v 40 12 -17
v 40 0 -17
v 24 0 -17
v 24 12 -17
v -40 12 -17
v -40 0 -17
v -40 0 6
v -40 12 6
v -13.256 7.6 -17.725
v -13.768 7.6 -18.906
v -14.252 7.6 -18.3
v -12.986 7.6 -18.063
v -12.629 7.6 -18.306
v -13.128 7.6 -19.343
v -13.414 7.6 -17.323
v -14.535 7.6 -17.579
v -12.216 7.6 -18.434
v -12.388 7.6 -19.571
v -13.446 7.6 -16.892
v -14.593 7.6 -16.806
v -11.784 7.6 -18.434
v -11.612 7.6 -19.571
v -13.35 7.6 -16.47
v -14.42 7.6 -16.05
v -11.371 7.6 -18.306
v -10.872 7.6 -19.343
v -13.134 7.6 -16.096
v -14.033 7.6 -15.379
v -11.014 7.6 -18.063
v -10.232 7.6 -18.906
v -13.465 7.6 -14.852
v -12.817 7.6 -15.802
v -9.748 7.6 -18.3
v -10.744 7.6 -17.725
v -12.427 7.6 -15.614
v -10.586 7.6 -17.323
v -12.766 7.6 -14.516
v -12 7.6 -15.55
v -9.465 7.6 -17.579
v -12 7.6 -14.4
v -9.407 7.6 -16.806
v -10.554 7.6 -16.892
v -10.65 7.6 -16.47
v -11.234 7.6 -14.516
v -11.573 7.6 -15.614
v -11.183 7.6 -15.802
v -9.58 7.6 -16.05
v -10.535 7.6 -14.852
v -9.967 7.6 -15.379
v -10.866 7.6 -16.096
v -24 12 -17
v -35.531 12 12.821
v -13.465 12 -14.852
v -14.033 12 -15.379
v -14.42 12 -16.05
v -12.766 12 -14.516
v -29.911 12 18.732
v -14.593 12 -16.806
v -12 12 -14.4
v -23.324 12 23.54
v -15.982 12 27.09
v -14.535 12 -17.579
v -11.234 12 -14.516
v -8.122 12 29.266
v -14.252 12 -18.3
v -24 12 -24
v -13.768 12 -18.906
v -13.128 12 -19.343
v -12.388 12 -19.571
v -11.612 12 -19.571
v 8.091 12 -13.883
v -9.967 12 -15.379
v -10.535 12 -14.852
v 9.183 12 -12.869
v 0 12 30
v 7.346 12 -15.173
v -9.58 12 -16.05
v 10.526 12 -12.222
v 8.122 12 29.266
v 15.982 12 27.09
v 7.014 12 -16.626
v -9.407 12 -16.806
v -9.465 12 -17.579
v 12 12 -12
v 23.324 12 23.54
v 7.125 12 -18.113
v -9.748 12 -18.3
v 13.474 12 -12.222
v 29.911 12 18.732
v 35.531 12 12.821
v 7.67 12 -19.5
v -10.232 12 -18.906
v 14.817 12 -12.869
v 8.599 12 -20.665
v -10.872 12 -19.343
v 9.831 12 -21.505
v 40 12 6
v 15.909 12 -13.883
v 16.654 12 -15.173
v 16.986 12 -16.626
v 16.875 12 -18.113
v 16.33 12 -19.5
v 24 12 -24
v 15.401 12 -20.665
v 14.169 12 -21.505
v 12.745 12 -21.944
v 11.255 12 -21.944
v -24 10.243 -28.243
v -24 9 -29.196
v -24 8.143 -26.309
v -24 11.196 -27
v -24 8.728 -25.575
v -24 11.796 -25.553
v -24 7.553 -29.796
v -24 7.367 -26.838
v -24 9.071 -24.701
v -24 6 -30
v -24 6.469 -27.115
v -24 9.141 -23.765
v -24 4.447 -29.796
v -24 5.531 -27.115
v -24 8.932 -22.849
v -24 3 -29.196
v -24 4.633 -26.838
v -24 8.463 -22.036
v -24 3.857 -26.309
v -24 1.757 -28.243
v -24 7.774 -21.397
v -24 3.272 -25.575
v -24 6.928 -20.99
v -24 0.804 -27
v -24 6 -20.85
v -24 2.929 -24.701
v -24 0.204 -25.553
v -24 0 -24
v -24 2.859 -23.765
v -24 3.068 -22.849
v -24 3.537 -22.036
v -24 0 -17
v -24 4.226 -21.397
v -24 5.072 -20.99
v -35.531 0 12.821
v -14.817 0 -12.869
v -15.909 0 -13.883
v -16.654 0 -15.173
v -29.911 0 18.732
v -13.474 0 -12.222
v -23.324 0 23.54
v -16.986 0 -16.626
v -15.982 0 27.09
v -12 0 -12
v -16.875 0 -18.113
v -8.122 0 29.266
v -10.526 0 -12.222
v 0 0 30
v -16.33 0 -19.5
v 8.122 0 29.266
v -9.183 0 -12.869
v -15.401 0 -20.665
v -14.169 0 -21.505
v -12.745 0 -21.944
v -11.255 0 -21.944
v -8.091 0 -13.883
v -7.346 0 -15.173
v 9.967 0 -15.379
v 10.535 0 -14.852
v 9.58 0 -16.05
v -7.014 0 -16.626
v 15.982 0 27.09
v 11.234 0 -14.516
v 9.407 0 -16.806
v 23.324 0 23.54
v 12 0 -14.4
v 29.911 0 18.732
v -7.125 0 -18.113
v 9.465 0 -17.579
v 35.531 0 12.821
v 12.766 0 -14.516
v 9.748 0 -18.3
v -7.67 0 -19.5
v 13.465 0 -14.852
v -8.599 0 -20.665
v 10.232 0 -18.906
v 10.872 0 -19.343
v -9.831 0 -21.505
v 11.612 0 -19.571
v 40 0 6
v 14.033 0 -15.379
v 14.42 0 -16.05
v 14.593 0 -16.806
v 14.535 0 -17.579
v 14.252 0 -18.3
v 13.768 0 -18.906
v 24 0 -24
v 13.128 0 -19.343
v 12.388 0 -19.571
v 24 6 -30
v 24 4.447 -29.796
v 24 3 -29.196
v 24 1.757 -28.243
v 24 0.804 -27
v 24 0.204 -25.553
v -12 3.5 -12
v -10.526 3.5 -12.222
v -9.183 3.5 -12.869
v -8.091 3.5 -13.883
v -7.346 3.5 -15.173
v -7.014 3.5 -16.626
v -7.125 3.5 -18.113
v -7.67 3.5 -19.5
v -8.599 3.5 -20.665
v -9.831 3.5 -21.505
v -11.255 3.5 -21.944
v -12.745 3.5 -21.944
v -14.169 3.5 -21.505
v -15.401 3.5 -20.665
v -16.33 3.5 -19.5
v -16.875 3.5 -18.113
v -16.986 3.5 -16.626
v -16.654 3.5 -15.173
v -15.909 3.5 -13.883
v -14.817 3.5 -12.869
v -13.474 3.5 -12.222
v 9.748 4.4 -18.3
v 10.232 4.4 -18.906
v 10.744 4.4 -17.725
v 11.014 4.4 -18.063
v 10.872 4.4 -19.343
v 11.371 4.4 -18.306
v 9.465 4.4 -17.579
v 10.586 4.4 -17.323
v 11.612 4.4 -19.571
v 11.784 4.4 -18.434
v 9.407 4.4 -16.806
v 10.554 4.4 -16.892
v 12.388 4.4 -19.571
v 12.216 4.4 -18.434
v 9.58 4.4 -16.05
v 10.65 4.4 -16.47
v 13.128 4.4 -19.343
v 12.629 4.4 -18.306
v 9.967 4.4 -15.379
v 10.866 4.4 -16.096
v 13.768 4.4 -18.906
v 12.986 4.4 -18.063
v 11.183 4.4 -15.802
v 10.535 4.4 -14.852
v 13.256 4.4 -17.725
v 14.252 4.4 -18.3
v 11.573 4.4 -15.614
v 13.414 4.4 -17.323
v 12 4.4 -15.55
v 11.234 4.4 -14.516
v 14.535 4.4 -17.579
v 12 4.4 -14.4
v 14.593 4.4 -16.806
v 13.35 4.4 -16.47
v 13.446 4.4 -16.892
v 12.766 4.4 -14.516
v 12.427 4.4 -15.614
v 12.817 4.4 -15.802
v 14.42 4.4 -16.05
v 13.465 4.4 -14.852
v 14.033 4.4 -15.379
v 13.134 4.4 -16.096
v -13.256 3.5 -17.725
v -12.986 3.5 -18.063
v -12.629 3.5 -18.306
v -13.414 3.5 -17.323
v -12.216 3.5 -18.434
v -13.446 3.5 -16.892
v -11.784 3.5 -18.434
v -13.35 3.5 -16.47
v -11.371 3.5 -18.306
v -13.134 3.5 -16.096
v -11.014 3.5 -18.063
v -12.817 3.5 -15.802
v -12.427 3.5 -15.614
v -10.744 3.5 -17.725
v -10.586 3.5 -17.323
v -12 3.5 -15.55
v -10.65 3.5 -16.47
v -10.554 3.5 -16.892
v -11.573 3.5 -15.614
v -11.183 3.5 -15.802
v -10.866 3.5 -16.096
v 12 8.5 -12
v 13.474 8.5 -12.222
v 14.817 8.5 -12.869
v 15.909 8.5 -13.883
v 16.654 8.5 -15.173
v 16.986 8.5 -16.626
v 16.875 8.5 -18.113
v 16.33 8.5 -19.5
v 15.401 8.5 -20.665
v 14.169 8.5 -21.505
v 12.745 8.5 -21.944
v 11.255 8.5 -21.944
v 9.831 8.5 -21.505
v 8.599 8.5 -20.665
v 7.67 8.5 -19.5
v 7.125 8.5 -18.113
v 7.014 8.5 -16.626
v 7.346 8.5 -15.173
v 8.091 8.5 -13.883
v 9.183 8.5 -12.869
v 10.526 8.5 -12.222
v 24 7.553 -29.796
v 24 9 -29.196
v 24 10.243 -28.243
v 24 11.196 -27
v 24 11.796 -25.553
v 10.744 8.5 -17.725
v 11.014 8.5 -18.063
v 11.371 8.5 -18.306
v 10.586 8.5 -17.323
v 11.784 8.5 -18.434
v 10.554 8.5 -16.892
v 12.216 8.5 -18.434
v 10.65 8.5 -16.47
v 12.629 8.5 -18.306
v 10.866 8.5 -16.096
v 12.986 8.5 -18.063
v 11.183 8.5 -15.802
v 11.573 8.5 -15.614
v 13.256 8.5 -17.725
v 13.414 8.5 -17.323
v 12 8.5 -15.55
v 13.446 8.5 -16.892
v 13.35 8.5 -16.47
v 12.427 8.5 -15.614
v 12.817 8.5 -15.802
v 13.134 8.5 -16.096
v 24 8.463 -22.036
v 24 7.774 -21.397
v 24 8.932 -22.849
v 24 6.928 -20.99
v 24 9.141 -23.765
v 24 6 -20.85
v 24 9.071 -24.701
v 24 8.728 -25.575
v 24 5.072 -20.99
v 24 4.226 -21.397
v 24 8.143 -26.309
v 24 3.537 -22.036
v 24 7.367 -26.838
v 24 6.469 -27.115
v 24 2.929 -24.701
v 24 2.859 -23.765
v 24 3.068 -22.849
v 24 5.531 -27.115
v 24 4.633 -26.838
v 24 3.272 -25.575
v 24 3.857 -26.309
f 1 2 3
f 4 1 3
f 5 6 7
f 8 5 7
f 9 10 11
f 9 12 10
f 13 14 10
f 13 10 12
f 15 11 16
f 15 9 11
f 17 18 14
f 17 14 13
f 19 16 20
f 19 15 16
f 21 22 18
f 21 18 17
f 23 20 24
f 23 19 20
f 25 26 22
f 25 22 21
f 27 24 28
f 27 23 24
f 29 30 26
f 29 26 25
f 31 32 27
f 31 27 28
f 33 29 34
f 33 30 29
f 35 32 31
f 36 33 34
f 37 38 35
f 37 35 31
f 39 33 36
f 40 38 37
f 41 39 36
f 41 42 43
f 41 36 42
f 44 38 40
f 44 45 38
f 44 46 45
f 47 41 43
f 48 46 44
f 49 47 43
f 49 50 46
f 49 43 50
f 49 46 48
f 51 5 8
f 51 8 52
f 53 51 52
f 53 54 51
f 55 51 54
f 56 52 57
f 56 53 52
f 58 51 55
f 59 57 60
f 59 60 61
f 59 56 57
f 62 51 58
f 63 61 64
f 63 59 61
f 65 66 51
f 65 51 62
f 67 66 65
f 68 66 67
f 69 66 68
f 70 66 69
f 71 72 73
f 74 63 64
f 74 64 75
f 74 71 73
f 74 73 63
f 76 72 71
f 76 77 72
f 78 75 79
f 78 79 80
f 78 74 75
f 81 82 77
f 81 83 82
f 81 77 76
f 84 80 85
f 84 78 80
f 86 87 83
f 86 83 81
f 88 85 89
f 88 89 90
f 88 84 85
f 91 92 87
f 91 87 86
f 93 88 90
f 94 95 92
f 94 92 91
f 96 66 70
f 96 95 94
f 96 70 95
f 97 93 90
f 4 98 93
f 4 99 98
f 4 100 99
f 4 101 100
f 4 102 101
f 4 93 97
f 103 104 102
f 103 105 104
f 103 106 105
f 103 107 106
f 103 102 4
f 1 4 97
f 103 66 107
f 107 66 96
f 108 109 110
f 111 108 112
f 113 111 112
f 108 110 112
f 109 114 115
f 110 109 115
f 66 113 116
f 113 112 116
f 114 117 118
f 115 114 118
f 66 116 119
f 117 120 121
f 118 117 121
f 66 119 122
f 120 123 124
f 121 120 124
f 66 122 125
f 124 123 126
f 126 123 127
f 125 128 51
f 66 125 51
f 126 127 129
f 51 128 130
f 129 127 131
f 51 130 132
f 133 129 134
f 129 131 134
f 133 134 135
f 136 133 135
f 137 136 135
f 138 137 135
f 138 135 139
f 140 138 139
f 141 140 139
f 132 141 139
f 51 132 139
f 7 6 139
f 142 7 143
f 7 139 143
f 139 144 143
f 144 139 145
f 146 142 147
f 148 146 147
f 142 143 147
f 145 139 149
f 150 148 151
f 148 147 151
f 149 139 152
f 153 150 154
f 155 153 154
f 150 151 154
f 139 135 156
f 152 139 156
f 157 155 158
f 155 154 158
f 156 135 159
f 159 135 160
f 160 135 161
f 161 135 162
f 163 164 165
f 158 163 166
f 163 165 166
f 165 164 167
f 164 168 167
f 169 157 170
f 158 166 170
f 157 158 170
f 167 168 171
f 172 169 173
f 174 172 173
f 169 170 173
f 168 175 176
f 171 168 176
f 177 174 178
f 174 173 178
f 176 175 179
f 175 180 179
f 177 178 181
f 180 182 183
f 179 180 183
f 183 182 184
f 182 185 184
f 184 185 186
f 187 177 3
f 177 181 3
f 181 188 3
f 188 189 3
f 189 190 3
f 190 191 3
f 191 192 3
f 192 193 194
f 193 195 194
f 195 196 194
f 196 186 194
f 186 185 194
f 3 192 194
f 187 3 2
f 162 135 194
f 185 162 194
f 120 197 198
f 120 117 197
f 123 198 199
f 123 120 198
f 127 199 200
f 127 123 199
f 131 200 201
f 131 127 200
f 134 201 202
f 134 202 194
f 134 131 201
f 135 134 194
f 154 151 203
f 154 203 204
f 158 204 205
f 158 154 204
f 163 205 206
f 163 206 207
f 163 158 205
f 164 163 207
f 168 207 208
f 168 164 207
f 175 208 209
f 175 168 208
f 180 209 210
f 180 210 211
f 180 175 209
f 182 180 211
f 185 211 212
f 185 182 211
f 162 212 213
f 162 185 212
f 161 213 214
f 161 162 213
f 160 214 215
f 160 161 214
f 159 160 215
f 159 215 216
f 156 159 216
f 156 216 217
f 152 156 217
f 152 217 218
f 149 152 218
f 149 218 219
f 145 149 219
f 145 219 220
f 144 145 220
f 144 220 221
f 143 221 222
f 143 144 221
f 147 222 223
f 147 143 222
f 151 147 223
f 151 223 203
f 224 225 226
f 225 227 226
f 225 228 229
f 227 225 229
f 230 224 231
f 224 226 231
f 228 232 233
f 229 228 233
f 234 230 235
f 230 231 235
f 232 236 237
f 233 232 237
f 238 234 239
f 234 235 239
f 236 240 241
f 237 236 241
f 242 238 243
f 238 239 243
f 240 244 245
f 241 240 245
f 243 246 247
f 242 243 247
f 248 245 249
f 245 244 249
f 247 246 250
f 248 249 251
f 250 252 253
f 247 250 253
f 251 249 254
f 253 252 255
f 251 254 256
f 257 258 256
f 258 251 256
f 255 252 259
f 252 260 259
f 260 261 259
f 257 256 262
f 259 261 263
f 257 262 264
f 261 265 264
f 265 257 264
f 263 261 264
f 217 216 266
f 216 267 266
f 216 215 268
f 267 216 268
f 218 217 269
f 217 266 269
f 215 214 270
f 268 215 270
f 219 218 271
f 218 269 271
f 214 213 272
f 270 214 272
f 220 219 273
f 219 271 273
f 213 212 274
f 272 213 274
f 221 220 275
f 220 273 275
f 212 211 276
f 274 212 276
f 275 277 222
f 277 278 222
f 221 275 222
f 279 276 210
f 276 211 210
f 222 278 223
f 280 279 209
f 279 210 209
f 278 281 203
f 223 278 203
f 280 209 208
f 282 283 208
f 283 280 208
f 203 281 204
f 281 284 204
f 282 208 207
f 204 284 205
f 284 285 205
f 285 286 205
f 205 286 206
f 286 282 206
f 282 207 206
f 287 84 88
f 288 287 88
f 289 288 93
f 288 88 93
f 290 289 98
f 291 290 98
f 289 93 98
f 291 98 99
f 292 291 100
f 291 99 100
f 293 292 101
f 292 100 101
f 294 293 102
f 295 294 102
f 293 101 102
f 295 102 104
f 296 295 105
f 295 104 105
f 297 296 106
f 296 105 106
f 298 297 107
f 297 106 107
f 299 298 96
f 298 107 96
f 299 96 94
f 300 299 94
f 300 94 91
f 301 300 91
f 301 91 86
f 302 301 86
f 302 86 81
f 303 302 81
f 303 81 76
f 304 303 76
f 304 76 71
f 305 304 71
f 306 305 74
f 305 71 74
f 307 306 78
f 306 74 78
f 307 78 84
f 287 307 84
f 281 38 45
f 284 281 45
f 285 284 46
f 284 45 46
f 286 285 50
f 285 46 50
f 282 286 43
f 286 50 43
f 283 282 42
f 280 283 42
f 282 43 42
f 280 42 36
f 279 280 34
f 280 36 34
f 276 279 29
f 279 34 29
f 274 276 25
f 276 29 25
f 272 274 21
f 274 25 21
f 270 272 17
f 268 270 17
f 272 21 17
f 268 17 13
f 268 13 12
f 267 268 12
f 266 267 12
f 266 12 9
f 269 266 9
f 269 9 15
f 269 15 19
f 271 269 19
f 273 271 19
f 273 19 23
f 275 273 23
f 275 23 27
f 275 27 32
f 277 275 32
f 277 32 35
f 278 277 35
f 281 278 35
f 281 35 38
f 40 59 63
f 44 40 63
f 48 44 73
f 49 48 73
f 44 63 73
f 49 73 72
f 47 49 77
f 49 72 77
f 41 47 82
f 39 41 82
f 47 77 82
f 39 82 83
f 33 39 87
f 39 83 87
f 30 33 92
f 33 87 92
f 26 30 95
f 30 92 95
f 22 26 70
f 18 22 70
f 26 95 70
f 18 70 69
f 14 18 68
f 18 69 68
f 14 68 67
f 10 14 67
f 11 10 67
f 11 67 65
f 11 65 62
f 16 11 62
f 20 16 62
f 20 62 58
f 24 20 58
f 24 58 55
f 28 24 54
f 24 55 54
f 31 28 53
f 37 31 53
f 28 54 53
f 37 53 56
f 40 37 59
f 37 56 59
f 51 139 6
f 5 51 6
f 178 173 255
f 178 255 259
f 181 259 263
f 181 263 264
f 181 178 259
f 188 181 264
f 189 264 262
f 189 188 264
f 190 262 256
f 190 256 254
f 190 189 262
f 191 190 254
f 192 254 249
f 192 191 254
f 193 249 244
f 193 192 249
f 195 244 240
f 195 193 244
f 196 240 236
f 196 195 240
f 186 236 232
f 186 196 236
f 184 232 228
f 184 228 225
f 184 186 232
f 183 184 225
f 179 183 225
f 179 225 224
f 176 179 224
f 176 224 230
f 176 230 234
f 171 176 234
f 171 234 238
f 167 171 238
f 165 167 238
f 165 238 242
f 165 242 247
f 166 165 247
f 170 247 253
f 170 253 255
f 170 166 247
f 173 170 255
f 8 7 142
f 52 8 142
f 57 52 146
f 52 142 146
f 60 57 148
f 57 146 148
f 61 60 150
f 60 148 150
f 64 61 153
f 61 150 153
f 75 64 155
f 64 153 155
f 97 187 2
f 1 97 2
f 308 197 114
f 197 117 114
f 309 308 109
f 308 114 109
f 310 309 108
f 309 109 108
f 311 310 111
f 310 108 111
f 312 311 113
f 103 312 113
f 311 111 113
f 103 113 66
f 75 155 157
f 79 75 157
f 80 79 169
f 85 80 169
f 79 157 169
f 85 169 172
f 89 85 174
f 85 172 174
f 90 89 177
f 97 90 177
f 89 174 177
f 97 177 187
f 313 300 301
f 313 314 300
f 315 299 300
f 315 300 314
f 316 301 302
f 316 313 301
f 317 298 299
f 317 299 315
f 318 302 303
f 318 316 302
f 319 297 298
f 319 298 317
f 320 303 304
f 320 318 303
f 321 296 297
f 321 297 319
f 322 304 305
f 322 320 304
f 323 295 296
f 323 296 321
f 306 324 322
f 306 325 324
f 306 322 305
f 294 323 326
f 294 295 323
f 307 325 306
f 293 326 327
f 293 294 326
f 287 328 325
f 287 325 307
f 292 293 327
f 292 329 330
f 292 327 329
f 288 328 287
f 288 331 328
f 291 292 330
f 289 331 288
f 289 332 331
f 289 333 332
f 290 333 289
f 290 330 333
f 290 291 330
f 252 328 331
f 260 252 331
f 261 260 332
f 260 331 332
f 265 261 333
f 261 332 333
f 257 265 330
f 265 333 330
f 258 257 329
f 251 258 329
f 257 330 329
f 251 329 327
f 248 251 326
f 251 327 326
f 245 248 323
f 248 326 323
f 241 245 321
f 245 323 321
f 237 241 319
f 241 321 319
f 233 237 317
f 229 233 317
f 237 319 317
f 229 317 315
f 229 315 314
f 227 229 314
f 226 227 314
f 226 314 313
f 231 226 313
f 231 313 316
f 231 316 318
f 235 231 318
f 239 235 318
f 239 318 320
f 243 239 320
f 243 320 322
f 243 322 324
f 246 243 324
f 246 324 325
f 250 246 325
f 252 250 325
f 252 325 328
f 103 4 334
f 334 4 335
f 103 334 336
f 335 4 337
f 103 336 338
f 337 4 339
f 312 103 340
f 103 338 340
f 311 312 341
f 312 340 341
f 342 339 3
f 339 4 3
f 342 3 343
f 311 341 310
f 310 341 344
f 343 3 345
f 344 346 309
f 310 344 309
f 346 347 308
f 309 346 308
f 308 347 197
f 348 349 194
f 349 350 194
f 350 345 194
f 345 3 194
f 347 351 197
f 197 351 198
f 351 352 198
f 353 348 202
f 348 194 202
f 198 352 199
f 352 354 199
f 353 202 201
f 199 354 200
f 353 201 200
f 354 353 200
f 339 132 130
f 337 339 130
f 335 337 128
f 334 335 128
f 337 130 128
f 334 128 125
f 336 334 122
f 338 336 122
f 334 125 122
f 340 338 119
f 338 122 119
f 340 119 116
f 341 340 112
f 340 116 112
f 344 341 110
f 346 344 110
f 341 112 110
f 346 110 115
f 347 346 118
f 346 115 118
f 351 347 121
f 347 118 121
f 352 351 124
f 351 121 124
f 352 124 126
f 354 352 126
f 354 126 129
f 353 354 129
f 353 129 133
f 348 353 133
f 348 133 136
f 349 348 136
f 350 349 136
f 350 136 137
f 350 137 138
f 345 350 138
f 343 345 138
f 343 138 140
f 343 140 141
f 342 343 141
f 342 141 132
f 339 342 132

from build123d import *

# Parameters (mm, degrees)
BOSS_EXTRUDE1_DEPTH = 12
FILLET1_R           = 6
SKETCH2_R           = 3.15
CUT_EXTRUDE1_DEPTH  = 70
CUT_EXTRUDE2_START  = -12
SKETCH3_R           = 5
CUT_EXTRUDE2_DEPTH  = 3.5
SKETCH3_3_R         = 1.45
CUT_EXTRUDE3_DEPTH  = 13.5
SKETCH3_4_R         = 2.6
CUT_EXTRUDE4_DEPTH  = 4.4
SKETCH3_5_R         = 5
CUT_EXTRUDE5_DEPTH  = 3.5
SKETCH3_6_R         = 1.45
CUT_EXTRUDE6_DEPTH  = 18
CUT_EXTRUDE7_START  = -12
SKETCH3_7_R         = 2.6
CUT_EXTRUDE7_DEPTH  = 4.4


with BuildPart() as part:
    # Sketch1 → Boss-Extrude1 (new body)
    with BuildSketch(Plane(origin=(0, 0, 0), x_dir=(1, 0, 0), z_dir=(0, 1, 0))):
        with BuildLine():
            ThreePointArc((-40, -6), (-23.323807589, -23.539679293), (-2.2e-08, -30))
            ThreePointArc((-2.2e-08, -30), (23.32380757, -23.539679305), (40, -6))
            Line((40, -6), (40, 17))
            Line((40, 17), (24, 17))
            Line((24, 17), (24, 30))
            Line((24, 30), (-24, 30))
            Line((-24, 30), (-24, 17))
            Line((-24, 17), (-40, 17))
            Line((-40, 17), (-40, -6))
        make_face()
    extrude(amount=BOSS_EXTRUDE1_DEPTH)

    # Fillet1
    fillet1_edges = [part.edges().sort_by_distance(p)[0] for p in [
        (0, 0, -30),
        (0, 12, -30),
    ]]
    fillet(fillet1_edges, radius=FILLET1_R - 0.0001)  # a hair under: the kernel refuses the full size

    # Sketch2 → Cut-Extrude1 (cut)
    with BuildSketch(Plane.ZY.offset(24)):
        with Locations((-24, 6)):
            Circle(SKETCH2_R)
    extrude(amount=-CUT_EXTRUDE1_DEPTH, mode=Mode.SUBTRACT)

    # Sketch3 → Cut-Extrude2 (cut)
    with BuildSketch(Plane(origin=(0, 12, 0), x_dir=(1, 0, 0), z_dir=(0, 1, 0)).offset(CUT_EXTRUDE2_START)):
        with Locations(Location((-12, 17, 0), (0, 0, 270))):
            Circle(SKETCH3_R)
    extrude(amount=CUT_EXTRUDE2_DEPTH, mode=Mode.SUBTRACT)

    # Sketch3<3> → Cut-Extrude3 (cut)
    with BuildSketch(Plane(origin=(0, 12, 0), x_dir=(1, 0, 0), z_dir=(0, 1, 0))):
        with Locations(Location((-12, 17, 0), (0, 0, 270))):
            Circle(SKETCH3_3_R)
    extrude(amount=-CUT_EXTRUDE3_DEPTH, mode=Mode.SUBTRACT)

    # Sketch3<4> → Cut-Extrude4 (cut)
    with BuildSketch(Plane(origin=(0, 12, 0), x_dir=(1, 0, 0), z_dir=(0, 1, 0))):
        with Locations(Location((-12, 17, 0), (0, 0, 270))):
            Circle(SKETCH3_4_R)
    extrude(amount=-CUT_EXTRUDE4_DEPTH, mode=Mode.SUBTRACT)

    # Sketch3<5> → Cut-Extrude5 (cut)
    with BuildSketch(Plane(origin=(0, 12, 0), x_dir=(1, 0, 0), z_dir=(0, 1, 0))):
        with Locations(Location((12, 17, 0), (0, 0, 270))):
            Circle(SKETCH3_5_R)
    extrude(amount=-CUT_EXTRUDE5_DEPTH, mode=Mode.SUBTRACT)

    # Sketch3<6> → Cut-Extrude6 (cut)
    with BuildSketch(Plane(origin=(0, 12, 0), x_dir=(1, 0, 0), z_dir=(0, 1, 0))):
        with Locations(Location((12, 17, 0), (0, 0, 270))):
            Circle(SKETCH3_6_R)
    extrude(amount=-CUT_EXTRUDE6_DEPTH, mode=Mode.SUBTRACT)

    # Sketch3<7> → Cut-Extrude7 (cut)
    with BuildSketch(Plane(origin=(0, 12, 0), x_dir=(1, 0, 0), z_dir=(0, 1, 0)).offset(CUT_EXTRUDE7_START)):
        with Locations(Location((12, 17, 0), (0, 0, 270))):
            Circle(SKETCH3_7_R)
    extrude(amount=CUT_EXTRUDE7_DEPTH, mode=Mode.SUBTRACT)


solid = part.part
